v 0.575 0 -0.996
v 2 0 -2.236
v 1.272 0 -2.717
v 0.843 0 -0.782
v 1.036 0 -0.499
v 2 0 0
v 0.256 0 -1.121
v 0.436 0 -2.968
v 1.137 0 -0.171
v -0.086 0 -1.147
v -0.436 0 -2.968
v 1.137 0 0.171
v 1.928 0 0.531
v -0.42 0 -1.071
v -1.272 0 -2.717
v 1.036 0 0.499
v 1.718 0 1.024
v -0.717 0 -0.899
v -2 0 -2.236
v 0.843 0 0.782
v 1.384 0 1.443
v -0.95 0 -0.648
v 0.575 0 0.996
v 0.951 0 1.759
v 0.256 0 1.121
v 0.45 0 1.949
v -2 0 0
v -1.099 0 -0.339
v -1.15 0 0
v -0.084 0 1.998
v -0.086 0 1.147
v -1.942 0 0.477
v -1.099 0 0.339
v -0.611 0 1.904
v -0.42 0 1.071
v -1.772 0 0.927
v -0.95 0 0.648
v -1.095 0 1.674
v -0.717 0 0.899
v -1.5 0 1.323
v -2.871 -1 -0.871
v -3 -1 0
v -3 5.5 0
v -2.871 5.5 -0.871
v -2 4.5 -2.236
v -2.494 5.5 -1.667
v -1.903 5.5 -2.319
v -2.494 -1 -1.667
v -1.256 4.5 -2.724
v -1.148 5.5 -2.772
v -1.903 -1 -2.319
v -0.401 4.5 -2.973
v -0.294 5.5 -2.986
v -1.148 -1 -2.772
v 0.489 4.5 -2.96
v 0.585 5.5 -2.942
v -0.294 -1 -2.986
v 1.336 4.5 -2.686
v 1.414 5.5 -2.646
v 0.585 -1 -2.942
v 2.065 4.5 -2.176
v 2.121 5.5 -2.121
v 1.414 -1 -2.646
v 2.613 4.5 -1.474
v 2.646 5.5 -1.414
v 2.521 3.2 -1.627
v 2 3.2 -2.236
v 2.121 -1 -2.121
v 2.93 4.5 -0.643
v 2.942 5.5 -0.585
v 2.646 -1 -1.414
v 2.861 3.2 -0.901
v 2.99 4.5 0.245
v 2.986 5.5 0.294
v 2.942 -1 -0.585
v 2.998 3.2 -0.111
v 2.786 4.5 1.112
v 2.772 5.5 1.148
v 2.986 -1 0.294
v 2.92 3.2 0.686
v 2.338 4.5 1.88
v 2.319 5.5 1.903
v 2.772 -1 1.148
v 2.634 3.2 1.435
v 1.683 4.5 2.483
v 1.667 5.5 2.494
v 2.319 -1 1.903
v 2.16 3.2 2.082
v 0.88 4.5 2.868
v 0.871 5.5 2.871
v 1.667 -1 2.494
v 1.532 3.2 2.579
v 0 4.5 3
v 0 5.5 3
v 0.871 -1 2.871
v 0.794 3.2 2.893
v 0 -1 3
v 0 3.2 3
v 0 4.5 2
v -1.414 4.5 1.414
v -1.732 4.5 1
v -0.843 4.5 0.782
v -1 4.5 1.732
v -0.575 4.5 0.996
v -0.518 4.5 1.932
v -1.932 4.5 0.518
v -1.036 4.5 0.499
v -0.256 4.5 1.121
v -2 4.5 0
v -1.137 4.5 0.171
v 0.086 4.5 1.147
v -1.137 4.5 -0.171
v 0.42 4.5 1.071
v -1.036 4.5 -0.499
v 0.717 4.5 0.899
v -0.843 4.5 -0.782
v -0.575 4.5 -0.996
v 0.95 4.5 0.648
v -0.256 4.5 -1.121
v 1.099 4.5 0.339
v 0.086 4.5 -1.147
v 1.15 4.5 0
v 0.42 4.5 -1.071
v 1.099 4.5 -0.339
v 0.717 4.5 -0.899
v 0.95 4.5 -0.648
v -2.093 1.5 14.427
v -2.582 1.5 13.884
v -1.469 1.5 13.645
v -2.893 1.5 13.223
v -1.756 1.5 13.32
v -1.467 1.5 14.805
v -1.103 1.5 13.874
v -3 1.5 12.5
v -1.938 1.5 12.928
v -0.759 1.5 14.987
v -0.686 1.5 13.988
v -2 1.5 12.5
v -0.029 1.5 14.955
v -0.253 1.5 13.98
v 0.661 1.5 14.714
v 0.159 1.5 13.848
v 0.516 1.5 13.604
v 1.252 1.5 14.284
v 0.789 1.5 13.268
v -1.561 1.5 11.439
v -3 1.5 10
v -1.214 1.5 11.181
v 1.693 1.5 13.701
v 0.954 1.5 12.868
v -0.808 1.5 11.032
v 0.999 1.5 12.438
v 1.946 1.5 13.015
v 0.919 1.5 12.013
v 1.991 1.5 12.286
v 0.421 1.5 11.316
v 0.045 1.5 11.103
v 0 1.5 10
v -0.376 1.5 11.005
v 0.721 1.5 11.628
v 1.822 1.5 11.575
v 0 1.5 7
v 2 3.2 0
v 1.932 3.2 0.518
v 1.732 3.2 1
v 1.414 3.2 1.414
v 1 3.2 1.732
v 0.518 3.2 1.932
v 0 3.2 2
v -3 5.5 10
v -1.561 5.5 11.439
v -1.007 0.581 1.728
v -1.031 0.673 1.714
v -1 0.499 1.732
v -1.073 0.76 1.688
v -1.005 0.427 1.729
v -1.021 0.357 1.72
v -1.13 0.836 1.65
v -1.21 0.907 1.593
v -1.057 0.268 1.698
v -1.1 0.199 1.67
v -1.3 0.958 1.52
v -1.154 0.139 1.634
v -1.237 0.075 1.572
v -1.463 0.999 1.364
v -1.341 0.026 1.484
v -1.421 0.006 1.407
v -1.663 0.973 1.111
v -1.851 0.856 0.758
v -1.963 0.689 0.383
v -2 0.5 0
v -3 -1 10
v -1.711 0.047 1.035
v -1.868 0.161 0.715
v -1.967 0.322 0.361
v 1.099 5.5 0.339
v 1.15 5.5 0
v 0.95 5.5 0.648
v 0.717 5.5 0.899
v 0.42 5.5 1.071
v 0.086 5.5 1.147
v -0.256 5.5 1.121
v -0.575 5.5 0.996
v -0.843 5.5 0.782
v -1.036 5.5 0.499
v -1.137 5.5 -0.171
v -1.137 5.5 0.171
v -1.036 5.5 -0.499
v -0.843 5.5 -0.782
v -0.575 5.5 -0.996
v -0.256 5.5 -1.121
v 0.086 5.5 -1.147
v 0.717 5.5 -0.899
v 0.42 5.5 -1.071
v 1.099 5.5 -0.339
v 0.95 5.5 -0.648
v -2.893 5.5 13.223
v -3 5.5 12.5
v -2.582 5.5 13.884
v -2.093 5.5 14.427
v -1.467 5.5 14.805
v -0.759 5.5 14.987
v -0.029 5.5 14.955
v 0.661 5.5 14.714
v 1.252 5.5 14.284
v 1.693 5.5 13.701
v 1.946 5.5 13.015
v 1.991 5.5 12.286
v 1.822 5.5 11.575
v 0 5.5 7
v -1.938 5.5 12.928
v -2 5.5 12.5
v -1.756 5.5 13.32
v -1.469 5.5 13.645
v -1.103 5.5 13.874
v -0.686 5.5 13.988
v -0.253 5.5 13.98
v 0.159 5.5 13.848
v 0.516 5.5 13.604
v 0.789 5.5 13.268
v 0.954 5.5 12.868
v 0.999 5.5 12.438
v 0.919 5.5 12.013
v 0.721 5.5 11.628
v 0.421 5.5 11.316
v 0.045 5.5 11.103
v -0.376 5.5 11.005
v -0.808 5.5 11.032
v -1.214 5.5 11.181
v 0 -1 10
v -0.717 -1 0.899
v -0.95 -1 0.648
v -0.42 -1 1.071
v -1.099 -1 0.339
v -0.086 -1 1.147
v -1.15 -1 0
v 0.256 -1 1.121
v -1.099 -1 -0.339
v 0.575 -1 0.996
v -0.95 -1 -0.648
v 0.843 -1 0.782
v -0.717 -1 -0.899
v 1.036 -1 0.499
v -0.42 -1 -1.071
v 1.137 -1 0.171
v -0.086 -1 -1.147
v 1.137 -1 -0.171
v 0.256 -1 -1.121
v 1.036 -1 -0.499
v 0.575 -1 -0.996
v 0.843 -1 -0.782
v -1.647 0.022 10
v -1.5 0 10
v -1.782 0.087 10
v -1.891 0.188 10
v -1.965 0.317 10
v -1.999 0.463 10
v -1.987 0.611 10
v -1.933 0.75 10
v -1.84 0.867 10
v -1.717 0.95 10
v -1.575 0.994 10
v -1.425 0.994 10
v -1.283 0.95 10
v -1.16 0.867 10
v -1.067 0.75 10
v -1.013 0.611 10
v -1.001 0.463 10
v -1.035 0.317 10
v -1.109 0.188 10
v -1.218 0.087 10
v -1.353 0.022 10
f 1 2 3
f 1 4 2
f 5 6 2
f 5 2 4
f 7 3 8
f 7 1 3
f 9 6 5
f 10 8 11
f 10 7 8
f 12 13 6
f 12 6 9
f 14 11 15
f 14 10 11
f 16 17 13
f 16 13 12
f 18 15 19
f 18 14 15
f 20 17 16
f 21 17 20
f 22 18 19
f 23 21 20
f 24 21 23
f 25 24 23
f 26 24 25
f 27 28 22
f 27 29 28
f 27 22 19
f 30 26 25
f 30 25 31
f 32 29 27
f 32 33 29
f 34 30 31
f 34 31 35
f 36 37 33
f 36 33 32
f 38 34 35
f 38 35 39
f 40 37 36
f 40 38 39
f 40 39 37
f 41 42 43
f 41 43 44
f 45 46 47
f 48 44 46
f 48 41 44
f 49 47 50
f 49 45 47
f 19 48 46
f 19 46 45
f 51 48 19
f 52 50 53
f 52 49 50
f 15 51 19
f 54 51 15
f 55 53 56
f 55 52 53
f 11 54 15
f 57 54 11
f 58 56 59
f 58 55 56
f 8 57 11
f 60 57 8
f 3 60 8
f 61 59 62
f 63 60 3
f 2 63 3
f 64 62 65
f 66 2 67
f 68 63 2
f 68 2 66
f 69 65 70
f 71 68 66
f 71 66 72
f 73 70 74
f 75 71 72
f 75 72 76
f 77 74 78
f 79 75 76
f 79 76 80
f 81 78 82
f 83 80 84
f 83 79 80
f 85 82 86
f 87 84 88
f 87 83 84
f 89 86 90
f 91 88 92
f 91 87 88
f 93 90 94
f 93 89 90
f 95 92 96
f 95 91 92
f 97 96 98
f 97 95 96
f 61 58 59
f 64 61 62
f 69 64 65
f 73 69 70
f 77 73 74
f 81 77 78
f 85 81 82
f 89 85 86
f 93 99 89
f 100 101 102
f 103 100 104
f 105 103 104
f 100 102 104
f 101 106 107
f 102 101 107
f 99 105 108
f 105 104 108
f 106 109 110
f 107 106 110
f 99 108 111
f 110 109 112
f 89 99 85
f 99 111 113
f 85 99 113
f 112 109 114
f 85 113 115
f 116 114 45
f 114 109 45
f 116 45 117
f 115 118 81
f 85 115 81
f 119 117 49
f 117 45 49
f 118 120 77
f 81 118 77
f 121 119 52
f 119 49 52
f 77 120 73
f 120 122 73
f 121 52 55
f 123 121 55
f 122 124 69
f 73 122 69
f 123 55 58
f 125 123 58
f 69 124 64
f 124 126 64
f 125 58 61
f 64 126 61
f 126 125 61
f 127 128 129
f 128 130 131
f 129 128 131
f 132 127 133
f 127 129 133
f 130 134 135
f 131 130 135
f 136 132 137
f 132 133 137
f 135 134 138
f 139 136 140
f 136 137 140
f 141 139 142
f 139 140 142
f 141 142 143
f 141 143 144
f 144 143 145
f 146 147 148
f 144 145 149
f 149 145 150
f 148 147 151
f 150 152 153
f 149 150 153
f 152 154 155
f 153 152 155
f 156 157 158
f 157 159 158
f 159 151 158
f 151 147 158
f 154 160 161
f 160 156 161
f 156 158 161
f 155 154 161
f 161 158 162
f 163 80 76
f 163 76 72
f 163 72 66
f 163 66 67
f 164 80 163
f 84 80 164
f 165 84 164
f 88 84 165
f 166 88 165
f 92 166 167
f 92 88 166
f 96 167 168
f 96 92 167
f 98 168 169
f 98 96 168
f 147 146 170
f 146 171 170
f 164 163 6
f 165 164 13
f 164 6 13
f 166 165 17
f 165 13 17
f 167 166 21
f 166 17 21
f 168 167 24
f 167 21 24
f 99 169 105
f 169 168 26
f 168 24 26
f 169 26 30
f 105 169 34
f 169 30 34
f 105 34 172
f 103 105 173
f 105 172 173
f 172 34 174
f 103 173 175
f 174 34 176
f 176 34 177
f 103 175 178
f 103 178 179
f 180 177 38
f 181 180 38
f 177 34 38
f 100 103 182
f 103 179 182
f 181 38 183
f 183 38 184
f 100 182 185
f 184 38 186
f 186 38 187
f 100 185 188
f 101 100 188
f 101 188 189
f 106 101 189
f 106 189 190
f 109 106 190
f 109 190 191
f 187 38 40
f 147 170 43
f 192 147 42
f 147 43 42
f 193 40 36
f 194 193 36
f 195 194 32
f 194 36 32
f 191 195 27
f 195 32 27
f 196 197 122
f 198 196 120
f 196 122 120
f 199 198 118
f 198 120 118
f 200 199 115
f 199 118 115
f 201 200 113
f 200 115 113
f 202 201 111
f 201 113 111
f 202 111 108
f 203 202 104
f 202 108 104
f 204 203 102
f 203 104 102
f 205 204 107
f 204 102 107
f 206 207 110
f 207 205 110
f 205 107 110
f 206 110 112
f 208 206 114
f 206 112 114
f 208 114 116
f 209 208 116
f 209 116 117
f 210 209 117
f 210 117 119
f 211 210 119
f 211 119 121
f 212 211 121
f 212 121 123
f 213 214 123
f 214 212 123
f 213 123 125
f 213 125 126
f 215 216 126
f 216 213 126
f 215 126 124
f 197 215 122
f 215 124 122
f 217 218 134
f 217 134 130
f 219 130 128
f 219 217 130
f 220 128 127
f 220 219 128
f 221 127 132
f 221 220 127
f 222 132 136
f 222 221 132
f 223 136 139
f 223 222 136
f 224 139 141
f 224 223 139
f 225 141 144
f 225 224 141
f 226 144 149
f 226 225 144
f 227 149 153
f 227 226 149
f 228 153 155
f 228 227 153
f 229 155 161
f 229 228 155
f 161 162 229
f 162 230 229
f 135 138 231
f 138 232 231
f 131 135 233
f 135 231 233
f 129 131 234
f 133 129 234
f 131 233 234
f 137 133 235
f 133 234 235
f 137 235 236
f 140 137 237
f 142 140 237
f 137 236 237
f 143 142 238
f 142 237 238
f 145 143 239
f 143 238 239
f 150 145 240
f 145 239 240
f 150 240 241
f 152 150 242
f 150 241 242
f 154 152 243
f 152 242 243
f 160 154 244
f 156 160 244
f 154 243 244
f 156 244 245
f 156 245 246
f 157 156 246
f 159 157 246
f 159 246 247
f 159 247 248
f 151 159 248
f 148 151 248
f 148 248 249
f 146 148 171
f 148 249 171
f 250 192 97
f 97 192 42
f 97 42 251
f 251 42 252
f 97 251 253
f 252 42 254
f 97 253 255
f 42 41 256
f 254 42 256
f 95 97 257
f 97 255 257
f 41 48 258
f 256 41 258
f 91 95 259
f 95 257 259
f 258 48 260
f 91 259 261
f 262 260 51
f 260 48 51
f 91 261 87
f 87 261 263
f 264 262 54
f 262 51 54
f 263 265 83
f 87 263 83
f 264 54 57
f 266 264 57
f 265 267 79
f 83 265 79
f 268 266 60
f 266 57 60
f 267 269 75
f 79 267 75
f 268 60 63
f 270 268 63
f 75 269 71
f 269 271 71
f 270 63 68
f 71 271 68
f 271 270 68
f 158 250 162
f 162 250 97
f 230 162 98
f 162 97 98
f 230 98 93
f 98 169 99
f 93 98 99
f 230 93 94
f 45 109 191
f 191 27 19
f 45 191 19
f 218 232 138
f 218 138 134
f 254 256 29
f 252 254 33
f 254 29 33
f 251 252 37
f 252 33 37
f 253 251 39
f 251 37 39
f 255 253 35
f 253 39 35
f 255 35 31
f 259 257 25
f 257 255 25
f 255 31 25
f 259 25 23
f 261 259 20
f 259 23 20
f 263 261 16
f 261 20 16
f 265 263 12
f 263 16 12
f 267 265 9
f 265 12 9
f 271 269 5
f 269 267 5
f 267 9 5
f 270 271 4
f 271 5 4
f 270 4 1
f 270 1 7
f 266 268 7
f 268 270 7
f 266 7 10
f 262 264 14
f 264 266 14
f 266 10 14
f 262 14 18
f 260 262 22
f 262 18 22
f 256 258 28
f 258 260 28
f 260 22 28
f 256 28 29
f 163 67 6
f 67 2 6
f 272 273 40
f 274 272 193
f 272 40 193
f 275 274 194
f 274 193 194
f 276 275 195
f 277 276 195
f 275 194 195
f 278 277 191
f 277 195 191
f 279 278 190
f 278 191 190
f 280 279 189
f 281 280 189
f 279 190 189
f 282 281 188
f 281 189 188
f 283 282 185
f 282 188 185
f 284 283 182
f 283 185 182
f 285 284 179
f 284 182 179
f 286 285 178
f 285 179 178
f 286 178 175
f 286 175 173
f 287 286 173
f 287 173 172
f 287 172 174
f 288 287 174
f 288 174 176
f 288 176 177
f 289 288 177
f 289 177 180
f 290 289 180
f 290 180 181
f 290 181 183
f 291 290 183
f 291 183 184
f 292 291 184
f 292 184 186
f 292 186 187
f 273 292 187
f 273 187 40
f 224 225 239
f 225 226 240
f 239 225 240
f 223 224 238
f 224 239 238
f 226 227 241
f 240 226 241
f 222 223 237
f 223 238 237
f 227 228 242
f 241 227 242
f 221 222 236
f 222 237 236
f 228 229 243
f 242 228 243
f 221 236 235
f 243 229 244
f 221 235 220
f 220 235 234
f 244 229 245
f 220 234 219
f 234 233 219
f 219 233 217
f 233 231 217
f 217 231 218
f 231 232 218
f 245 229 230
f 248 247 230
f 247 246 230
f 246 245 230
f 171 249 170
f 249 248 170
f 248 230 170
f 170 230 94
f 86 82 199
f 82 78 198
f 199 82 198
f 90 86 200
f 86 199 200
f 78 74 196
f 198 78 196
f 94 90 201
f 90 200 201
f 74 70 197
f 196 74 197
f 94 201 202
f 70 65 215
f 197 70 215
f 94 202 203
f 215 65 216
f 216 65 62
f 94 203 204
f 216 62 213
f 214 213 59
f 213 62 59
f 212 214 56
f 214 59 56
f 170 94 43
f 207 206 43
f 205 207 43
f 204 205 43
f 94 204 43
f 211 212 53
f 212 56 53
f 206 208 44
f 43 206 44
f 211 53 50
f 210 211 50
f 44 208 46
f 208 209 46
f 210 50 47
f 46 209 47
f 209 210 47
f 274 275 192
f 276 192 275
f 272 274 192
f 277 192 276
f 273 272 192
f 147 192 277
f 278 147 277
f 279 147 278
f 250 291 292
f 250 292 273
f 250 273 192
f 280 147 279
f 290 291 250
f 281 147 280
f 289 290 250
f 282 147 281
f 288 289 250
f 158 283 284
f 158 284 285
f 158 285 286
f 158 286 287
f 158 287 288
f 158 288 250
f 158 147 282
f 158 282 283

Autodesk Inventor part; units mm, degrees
ref_plane "YZ Plane" through (0, 0, 0) normal (1, 0, 0) x (0, 1, 0)
ref_plane "XZ Plane" through (0, 0, 0) normal (0, 1, 0) x (-1, 0, 0)
ref_plane "XY Plane" through (0, 0, 0) normal (0, 0, 1) x (1, 0, 0)
sketch "スケッチ1" plane through (0, 0, 0) normal (0, 1, 0) x (-1, 0, 0)
  circle A0 centre (0, 0) radius 1.15
  circle A1 centre (0, 0) radius 2
  circle A2 centre (0, 0) radius 3
  line L0 (0, 0) -> (0, 3)
  line L1 (-2, 0) -> (2, 0)
  line L2 (2, 0) -> (2, -3)
  line L3 (2, -3) -> (-2, -3)
  line L4 (-2, -3) -> (-2, 0)
  line L5 (0, 0) -> (3, 0)
  line L6 (3, 0) -> (3, 3)
  line L7 (3, 3) -> (0, 3)
  line L8 (0, 3) -> (0, 0)
  point P0 (-2, -2.2361)
  point P1 (0, 2)
  point P2 (2, -2.2361)
  dimension "d1" = 4
  dimension "d2" = 6
  dimension "d0" = 2.3
extrude "押し出し1" add sketch "スケッチ1" along normal blind 3.2 contours A1 L4 A2 L0
extrude "押し出し2" add sketch "スケッチ1" along normal blind 4.5 contours L5 A2 L2 | A1 L0 A2 L5 | A2 L7 L6
extrude "押し出し3" add sketch "スケッチ1" against normal blind 1 contours L1 A1 A0 | A0 L0 A1 L1 | A0 L1 A1 L0 | L2 A2 L4 A1 | L5 A2 L2 | A1 L0 A2 L5 | A1 L4 A2 L0 | A2 L7 L6
sketch "スケッチ2" plane through (0, 4.5, 0) normal (0, 1, 0) x (1, 0, 0)
  circle A0 centre (0, 0) radius 1.15
  circle A1 centre (0, 0) radius 2
  circle A2 centre (0, 0) radius 3
  line L0 (0, 0) -> (-3, 0)
  line L1 (-3, 0) -> (-3, -3)
  line L2 (-3, -3) -> (0, -3)
  line L3 (0, -3) -> (0, 0)
  dimension "d9" = 2.3
  dimension "d10" = 4
  dimension "d11" = 6
extrude "押し出し4" add sketch "スケッチ2" along normal blind 1 contours A0 L0 A1 L3 | A0 L3 A1 L0 | L0 A2 L3 A1 | A1 L3 A2 L0 | A2 L2 L1
sketch "スケッチ3" plane through (-3, -1, 3) normal (0, 0, 1) x (1, 0, 0)
  line L0 (0, 6.5) -> (0, 0) projected
  line L1 (3, 5.5) -> (3, 6.5) projected
  line L2 (0, 0) -> (3, 0)
  line L3 (3, 0) -> (3, 6.5)
  line L4 (3, 6.5) -> (0, 6.5)
  line L5 (0, 6.5) -> (0, 0)
  point P0 (3, 1)
extrude "押し出し5" add sketch "スケッチ3" along normal blind 7
sketch "スケッチ4" plane through (-3, -1, 10) normal (0, 0, 1) x (1, 0, 0)
  line L0 (4.15, 0) -> (1.85, 0) projected
  line L1 (3, 0) -> (1.5, 0)
  line L2 (1.5, 0) -> (1.5, 1.5)
  line L3 (1.5, 1.5) -> (3, 1.5)
  line L4 (3, 1.5) -> (3, 0)
  point P0 (3, 1)
  dimension "d16" = 1.5
  dimension "d17" = 1.5
hole "穴1" at (-1.5, 0.5, 10) direction (0, 0, -1) diameter 1 end through all
sketch "スケッチ5" plane through (0, 3.2, 3) normal (1, 0, 0) x (0, 0, -1)
  point P0 (3, -3.2)
sketch "スケッチ6" plane through (0, 5.5, 0) normal (0, 1, 0) x (1, 0, 0)
  line L0 (-3, -10) -> (0, -10) projected
  line L1 (-3, -10) -> (2, -10)
  line L2 (2, -10) -> (2, -15)
  line L3 (2, -15) -> (-3, -15)
  line L4 (-3, -15) -> (-3, -10)
  line L5 (2, -10) -> (-0.5, -10)
  line L6 (-0.5, -10) -> (-0.5, -12.5)
  line L7 (-0.5, -12.5) -> (2, -12.5)
  line L8 (2, -12.5) -> (2, -10)
  circle A0 centre (-0.5, -12.5) radius 2.5
  circle A1 centre (-0.5, -12.5) radius 1.5
  line L9 (-0.5, -12.5) -> (-3, -10)
  line L10 (-0.5, -12.5) -> (-3, -12.5)
  line L11 (0, -3) -> (0, -10) projected
  line L12 (-3, -10) -> (0, -10)
  line L13 (0, -10) -> (0, -7)
  line L14 (0, -7) -> (-3, -7)
  line L15 (-3, -7) -> (-3, -10)
  line L16 (0, -7) -> (1.8225, -11.5748)
  point P0 (0, 0)
  point P1 (-2, -12.5)
  point P2 (-1.5607, -11.4393)
  dimension "d25" = 5
  dimension "d26" = 5
  dimension "d27" = 2.5
  dimension "d28" = 2.5
  dimension "d29" = 3
  dimension "d30" = 3
extrude "押し出し6" add sketch "スケッチ6" against normal blind 4 contours L0 A0 L9 | A0 L7 A1 L6 | L0 L1 L16 A0 | L6 A1 L9 A0 | L10 A1 L7 A0 | L11 L16 L1
properties part number "srod1.1"
